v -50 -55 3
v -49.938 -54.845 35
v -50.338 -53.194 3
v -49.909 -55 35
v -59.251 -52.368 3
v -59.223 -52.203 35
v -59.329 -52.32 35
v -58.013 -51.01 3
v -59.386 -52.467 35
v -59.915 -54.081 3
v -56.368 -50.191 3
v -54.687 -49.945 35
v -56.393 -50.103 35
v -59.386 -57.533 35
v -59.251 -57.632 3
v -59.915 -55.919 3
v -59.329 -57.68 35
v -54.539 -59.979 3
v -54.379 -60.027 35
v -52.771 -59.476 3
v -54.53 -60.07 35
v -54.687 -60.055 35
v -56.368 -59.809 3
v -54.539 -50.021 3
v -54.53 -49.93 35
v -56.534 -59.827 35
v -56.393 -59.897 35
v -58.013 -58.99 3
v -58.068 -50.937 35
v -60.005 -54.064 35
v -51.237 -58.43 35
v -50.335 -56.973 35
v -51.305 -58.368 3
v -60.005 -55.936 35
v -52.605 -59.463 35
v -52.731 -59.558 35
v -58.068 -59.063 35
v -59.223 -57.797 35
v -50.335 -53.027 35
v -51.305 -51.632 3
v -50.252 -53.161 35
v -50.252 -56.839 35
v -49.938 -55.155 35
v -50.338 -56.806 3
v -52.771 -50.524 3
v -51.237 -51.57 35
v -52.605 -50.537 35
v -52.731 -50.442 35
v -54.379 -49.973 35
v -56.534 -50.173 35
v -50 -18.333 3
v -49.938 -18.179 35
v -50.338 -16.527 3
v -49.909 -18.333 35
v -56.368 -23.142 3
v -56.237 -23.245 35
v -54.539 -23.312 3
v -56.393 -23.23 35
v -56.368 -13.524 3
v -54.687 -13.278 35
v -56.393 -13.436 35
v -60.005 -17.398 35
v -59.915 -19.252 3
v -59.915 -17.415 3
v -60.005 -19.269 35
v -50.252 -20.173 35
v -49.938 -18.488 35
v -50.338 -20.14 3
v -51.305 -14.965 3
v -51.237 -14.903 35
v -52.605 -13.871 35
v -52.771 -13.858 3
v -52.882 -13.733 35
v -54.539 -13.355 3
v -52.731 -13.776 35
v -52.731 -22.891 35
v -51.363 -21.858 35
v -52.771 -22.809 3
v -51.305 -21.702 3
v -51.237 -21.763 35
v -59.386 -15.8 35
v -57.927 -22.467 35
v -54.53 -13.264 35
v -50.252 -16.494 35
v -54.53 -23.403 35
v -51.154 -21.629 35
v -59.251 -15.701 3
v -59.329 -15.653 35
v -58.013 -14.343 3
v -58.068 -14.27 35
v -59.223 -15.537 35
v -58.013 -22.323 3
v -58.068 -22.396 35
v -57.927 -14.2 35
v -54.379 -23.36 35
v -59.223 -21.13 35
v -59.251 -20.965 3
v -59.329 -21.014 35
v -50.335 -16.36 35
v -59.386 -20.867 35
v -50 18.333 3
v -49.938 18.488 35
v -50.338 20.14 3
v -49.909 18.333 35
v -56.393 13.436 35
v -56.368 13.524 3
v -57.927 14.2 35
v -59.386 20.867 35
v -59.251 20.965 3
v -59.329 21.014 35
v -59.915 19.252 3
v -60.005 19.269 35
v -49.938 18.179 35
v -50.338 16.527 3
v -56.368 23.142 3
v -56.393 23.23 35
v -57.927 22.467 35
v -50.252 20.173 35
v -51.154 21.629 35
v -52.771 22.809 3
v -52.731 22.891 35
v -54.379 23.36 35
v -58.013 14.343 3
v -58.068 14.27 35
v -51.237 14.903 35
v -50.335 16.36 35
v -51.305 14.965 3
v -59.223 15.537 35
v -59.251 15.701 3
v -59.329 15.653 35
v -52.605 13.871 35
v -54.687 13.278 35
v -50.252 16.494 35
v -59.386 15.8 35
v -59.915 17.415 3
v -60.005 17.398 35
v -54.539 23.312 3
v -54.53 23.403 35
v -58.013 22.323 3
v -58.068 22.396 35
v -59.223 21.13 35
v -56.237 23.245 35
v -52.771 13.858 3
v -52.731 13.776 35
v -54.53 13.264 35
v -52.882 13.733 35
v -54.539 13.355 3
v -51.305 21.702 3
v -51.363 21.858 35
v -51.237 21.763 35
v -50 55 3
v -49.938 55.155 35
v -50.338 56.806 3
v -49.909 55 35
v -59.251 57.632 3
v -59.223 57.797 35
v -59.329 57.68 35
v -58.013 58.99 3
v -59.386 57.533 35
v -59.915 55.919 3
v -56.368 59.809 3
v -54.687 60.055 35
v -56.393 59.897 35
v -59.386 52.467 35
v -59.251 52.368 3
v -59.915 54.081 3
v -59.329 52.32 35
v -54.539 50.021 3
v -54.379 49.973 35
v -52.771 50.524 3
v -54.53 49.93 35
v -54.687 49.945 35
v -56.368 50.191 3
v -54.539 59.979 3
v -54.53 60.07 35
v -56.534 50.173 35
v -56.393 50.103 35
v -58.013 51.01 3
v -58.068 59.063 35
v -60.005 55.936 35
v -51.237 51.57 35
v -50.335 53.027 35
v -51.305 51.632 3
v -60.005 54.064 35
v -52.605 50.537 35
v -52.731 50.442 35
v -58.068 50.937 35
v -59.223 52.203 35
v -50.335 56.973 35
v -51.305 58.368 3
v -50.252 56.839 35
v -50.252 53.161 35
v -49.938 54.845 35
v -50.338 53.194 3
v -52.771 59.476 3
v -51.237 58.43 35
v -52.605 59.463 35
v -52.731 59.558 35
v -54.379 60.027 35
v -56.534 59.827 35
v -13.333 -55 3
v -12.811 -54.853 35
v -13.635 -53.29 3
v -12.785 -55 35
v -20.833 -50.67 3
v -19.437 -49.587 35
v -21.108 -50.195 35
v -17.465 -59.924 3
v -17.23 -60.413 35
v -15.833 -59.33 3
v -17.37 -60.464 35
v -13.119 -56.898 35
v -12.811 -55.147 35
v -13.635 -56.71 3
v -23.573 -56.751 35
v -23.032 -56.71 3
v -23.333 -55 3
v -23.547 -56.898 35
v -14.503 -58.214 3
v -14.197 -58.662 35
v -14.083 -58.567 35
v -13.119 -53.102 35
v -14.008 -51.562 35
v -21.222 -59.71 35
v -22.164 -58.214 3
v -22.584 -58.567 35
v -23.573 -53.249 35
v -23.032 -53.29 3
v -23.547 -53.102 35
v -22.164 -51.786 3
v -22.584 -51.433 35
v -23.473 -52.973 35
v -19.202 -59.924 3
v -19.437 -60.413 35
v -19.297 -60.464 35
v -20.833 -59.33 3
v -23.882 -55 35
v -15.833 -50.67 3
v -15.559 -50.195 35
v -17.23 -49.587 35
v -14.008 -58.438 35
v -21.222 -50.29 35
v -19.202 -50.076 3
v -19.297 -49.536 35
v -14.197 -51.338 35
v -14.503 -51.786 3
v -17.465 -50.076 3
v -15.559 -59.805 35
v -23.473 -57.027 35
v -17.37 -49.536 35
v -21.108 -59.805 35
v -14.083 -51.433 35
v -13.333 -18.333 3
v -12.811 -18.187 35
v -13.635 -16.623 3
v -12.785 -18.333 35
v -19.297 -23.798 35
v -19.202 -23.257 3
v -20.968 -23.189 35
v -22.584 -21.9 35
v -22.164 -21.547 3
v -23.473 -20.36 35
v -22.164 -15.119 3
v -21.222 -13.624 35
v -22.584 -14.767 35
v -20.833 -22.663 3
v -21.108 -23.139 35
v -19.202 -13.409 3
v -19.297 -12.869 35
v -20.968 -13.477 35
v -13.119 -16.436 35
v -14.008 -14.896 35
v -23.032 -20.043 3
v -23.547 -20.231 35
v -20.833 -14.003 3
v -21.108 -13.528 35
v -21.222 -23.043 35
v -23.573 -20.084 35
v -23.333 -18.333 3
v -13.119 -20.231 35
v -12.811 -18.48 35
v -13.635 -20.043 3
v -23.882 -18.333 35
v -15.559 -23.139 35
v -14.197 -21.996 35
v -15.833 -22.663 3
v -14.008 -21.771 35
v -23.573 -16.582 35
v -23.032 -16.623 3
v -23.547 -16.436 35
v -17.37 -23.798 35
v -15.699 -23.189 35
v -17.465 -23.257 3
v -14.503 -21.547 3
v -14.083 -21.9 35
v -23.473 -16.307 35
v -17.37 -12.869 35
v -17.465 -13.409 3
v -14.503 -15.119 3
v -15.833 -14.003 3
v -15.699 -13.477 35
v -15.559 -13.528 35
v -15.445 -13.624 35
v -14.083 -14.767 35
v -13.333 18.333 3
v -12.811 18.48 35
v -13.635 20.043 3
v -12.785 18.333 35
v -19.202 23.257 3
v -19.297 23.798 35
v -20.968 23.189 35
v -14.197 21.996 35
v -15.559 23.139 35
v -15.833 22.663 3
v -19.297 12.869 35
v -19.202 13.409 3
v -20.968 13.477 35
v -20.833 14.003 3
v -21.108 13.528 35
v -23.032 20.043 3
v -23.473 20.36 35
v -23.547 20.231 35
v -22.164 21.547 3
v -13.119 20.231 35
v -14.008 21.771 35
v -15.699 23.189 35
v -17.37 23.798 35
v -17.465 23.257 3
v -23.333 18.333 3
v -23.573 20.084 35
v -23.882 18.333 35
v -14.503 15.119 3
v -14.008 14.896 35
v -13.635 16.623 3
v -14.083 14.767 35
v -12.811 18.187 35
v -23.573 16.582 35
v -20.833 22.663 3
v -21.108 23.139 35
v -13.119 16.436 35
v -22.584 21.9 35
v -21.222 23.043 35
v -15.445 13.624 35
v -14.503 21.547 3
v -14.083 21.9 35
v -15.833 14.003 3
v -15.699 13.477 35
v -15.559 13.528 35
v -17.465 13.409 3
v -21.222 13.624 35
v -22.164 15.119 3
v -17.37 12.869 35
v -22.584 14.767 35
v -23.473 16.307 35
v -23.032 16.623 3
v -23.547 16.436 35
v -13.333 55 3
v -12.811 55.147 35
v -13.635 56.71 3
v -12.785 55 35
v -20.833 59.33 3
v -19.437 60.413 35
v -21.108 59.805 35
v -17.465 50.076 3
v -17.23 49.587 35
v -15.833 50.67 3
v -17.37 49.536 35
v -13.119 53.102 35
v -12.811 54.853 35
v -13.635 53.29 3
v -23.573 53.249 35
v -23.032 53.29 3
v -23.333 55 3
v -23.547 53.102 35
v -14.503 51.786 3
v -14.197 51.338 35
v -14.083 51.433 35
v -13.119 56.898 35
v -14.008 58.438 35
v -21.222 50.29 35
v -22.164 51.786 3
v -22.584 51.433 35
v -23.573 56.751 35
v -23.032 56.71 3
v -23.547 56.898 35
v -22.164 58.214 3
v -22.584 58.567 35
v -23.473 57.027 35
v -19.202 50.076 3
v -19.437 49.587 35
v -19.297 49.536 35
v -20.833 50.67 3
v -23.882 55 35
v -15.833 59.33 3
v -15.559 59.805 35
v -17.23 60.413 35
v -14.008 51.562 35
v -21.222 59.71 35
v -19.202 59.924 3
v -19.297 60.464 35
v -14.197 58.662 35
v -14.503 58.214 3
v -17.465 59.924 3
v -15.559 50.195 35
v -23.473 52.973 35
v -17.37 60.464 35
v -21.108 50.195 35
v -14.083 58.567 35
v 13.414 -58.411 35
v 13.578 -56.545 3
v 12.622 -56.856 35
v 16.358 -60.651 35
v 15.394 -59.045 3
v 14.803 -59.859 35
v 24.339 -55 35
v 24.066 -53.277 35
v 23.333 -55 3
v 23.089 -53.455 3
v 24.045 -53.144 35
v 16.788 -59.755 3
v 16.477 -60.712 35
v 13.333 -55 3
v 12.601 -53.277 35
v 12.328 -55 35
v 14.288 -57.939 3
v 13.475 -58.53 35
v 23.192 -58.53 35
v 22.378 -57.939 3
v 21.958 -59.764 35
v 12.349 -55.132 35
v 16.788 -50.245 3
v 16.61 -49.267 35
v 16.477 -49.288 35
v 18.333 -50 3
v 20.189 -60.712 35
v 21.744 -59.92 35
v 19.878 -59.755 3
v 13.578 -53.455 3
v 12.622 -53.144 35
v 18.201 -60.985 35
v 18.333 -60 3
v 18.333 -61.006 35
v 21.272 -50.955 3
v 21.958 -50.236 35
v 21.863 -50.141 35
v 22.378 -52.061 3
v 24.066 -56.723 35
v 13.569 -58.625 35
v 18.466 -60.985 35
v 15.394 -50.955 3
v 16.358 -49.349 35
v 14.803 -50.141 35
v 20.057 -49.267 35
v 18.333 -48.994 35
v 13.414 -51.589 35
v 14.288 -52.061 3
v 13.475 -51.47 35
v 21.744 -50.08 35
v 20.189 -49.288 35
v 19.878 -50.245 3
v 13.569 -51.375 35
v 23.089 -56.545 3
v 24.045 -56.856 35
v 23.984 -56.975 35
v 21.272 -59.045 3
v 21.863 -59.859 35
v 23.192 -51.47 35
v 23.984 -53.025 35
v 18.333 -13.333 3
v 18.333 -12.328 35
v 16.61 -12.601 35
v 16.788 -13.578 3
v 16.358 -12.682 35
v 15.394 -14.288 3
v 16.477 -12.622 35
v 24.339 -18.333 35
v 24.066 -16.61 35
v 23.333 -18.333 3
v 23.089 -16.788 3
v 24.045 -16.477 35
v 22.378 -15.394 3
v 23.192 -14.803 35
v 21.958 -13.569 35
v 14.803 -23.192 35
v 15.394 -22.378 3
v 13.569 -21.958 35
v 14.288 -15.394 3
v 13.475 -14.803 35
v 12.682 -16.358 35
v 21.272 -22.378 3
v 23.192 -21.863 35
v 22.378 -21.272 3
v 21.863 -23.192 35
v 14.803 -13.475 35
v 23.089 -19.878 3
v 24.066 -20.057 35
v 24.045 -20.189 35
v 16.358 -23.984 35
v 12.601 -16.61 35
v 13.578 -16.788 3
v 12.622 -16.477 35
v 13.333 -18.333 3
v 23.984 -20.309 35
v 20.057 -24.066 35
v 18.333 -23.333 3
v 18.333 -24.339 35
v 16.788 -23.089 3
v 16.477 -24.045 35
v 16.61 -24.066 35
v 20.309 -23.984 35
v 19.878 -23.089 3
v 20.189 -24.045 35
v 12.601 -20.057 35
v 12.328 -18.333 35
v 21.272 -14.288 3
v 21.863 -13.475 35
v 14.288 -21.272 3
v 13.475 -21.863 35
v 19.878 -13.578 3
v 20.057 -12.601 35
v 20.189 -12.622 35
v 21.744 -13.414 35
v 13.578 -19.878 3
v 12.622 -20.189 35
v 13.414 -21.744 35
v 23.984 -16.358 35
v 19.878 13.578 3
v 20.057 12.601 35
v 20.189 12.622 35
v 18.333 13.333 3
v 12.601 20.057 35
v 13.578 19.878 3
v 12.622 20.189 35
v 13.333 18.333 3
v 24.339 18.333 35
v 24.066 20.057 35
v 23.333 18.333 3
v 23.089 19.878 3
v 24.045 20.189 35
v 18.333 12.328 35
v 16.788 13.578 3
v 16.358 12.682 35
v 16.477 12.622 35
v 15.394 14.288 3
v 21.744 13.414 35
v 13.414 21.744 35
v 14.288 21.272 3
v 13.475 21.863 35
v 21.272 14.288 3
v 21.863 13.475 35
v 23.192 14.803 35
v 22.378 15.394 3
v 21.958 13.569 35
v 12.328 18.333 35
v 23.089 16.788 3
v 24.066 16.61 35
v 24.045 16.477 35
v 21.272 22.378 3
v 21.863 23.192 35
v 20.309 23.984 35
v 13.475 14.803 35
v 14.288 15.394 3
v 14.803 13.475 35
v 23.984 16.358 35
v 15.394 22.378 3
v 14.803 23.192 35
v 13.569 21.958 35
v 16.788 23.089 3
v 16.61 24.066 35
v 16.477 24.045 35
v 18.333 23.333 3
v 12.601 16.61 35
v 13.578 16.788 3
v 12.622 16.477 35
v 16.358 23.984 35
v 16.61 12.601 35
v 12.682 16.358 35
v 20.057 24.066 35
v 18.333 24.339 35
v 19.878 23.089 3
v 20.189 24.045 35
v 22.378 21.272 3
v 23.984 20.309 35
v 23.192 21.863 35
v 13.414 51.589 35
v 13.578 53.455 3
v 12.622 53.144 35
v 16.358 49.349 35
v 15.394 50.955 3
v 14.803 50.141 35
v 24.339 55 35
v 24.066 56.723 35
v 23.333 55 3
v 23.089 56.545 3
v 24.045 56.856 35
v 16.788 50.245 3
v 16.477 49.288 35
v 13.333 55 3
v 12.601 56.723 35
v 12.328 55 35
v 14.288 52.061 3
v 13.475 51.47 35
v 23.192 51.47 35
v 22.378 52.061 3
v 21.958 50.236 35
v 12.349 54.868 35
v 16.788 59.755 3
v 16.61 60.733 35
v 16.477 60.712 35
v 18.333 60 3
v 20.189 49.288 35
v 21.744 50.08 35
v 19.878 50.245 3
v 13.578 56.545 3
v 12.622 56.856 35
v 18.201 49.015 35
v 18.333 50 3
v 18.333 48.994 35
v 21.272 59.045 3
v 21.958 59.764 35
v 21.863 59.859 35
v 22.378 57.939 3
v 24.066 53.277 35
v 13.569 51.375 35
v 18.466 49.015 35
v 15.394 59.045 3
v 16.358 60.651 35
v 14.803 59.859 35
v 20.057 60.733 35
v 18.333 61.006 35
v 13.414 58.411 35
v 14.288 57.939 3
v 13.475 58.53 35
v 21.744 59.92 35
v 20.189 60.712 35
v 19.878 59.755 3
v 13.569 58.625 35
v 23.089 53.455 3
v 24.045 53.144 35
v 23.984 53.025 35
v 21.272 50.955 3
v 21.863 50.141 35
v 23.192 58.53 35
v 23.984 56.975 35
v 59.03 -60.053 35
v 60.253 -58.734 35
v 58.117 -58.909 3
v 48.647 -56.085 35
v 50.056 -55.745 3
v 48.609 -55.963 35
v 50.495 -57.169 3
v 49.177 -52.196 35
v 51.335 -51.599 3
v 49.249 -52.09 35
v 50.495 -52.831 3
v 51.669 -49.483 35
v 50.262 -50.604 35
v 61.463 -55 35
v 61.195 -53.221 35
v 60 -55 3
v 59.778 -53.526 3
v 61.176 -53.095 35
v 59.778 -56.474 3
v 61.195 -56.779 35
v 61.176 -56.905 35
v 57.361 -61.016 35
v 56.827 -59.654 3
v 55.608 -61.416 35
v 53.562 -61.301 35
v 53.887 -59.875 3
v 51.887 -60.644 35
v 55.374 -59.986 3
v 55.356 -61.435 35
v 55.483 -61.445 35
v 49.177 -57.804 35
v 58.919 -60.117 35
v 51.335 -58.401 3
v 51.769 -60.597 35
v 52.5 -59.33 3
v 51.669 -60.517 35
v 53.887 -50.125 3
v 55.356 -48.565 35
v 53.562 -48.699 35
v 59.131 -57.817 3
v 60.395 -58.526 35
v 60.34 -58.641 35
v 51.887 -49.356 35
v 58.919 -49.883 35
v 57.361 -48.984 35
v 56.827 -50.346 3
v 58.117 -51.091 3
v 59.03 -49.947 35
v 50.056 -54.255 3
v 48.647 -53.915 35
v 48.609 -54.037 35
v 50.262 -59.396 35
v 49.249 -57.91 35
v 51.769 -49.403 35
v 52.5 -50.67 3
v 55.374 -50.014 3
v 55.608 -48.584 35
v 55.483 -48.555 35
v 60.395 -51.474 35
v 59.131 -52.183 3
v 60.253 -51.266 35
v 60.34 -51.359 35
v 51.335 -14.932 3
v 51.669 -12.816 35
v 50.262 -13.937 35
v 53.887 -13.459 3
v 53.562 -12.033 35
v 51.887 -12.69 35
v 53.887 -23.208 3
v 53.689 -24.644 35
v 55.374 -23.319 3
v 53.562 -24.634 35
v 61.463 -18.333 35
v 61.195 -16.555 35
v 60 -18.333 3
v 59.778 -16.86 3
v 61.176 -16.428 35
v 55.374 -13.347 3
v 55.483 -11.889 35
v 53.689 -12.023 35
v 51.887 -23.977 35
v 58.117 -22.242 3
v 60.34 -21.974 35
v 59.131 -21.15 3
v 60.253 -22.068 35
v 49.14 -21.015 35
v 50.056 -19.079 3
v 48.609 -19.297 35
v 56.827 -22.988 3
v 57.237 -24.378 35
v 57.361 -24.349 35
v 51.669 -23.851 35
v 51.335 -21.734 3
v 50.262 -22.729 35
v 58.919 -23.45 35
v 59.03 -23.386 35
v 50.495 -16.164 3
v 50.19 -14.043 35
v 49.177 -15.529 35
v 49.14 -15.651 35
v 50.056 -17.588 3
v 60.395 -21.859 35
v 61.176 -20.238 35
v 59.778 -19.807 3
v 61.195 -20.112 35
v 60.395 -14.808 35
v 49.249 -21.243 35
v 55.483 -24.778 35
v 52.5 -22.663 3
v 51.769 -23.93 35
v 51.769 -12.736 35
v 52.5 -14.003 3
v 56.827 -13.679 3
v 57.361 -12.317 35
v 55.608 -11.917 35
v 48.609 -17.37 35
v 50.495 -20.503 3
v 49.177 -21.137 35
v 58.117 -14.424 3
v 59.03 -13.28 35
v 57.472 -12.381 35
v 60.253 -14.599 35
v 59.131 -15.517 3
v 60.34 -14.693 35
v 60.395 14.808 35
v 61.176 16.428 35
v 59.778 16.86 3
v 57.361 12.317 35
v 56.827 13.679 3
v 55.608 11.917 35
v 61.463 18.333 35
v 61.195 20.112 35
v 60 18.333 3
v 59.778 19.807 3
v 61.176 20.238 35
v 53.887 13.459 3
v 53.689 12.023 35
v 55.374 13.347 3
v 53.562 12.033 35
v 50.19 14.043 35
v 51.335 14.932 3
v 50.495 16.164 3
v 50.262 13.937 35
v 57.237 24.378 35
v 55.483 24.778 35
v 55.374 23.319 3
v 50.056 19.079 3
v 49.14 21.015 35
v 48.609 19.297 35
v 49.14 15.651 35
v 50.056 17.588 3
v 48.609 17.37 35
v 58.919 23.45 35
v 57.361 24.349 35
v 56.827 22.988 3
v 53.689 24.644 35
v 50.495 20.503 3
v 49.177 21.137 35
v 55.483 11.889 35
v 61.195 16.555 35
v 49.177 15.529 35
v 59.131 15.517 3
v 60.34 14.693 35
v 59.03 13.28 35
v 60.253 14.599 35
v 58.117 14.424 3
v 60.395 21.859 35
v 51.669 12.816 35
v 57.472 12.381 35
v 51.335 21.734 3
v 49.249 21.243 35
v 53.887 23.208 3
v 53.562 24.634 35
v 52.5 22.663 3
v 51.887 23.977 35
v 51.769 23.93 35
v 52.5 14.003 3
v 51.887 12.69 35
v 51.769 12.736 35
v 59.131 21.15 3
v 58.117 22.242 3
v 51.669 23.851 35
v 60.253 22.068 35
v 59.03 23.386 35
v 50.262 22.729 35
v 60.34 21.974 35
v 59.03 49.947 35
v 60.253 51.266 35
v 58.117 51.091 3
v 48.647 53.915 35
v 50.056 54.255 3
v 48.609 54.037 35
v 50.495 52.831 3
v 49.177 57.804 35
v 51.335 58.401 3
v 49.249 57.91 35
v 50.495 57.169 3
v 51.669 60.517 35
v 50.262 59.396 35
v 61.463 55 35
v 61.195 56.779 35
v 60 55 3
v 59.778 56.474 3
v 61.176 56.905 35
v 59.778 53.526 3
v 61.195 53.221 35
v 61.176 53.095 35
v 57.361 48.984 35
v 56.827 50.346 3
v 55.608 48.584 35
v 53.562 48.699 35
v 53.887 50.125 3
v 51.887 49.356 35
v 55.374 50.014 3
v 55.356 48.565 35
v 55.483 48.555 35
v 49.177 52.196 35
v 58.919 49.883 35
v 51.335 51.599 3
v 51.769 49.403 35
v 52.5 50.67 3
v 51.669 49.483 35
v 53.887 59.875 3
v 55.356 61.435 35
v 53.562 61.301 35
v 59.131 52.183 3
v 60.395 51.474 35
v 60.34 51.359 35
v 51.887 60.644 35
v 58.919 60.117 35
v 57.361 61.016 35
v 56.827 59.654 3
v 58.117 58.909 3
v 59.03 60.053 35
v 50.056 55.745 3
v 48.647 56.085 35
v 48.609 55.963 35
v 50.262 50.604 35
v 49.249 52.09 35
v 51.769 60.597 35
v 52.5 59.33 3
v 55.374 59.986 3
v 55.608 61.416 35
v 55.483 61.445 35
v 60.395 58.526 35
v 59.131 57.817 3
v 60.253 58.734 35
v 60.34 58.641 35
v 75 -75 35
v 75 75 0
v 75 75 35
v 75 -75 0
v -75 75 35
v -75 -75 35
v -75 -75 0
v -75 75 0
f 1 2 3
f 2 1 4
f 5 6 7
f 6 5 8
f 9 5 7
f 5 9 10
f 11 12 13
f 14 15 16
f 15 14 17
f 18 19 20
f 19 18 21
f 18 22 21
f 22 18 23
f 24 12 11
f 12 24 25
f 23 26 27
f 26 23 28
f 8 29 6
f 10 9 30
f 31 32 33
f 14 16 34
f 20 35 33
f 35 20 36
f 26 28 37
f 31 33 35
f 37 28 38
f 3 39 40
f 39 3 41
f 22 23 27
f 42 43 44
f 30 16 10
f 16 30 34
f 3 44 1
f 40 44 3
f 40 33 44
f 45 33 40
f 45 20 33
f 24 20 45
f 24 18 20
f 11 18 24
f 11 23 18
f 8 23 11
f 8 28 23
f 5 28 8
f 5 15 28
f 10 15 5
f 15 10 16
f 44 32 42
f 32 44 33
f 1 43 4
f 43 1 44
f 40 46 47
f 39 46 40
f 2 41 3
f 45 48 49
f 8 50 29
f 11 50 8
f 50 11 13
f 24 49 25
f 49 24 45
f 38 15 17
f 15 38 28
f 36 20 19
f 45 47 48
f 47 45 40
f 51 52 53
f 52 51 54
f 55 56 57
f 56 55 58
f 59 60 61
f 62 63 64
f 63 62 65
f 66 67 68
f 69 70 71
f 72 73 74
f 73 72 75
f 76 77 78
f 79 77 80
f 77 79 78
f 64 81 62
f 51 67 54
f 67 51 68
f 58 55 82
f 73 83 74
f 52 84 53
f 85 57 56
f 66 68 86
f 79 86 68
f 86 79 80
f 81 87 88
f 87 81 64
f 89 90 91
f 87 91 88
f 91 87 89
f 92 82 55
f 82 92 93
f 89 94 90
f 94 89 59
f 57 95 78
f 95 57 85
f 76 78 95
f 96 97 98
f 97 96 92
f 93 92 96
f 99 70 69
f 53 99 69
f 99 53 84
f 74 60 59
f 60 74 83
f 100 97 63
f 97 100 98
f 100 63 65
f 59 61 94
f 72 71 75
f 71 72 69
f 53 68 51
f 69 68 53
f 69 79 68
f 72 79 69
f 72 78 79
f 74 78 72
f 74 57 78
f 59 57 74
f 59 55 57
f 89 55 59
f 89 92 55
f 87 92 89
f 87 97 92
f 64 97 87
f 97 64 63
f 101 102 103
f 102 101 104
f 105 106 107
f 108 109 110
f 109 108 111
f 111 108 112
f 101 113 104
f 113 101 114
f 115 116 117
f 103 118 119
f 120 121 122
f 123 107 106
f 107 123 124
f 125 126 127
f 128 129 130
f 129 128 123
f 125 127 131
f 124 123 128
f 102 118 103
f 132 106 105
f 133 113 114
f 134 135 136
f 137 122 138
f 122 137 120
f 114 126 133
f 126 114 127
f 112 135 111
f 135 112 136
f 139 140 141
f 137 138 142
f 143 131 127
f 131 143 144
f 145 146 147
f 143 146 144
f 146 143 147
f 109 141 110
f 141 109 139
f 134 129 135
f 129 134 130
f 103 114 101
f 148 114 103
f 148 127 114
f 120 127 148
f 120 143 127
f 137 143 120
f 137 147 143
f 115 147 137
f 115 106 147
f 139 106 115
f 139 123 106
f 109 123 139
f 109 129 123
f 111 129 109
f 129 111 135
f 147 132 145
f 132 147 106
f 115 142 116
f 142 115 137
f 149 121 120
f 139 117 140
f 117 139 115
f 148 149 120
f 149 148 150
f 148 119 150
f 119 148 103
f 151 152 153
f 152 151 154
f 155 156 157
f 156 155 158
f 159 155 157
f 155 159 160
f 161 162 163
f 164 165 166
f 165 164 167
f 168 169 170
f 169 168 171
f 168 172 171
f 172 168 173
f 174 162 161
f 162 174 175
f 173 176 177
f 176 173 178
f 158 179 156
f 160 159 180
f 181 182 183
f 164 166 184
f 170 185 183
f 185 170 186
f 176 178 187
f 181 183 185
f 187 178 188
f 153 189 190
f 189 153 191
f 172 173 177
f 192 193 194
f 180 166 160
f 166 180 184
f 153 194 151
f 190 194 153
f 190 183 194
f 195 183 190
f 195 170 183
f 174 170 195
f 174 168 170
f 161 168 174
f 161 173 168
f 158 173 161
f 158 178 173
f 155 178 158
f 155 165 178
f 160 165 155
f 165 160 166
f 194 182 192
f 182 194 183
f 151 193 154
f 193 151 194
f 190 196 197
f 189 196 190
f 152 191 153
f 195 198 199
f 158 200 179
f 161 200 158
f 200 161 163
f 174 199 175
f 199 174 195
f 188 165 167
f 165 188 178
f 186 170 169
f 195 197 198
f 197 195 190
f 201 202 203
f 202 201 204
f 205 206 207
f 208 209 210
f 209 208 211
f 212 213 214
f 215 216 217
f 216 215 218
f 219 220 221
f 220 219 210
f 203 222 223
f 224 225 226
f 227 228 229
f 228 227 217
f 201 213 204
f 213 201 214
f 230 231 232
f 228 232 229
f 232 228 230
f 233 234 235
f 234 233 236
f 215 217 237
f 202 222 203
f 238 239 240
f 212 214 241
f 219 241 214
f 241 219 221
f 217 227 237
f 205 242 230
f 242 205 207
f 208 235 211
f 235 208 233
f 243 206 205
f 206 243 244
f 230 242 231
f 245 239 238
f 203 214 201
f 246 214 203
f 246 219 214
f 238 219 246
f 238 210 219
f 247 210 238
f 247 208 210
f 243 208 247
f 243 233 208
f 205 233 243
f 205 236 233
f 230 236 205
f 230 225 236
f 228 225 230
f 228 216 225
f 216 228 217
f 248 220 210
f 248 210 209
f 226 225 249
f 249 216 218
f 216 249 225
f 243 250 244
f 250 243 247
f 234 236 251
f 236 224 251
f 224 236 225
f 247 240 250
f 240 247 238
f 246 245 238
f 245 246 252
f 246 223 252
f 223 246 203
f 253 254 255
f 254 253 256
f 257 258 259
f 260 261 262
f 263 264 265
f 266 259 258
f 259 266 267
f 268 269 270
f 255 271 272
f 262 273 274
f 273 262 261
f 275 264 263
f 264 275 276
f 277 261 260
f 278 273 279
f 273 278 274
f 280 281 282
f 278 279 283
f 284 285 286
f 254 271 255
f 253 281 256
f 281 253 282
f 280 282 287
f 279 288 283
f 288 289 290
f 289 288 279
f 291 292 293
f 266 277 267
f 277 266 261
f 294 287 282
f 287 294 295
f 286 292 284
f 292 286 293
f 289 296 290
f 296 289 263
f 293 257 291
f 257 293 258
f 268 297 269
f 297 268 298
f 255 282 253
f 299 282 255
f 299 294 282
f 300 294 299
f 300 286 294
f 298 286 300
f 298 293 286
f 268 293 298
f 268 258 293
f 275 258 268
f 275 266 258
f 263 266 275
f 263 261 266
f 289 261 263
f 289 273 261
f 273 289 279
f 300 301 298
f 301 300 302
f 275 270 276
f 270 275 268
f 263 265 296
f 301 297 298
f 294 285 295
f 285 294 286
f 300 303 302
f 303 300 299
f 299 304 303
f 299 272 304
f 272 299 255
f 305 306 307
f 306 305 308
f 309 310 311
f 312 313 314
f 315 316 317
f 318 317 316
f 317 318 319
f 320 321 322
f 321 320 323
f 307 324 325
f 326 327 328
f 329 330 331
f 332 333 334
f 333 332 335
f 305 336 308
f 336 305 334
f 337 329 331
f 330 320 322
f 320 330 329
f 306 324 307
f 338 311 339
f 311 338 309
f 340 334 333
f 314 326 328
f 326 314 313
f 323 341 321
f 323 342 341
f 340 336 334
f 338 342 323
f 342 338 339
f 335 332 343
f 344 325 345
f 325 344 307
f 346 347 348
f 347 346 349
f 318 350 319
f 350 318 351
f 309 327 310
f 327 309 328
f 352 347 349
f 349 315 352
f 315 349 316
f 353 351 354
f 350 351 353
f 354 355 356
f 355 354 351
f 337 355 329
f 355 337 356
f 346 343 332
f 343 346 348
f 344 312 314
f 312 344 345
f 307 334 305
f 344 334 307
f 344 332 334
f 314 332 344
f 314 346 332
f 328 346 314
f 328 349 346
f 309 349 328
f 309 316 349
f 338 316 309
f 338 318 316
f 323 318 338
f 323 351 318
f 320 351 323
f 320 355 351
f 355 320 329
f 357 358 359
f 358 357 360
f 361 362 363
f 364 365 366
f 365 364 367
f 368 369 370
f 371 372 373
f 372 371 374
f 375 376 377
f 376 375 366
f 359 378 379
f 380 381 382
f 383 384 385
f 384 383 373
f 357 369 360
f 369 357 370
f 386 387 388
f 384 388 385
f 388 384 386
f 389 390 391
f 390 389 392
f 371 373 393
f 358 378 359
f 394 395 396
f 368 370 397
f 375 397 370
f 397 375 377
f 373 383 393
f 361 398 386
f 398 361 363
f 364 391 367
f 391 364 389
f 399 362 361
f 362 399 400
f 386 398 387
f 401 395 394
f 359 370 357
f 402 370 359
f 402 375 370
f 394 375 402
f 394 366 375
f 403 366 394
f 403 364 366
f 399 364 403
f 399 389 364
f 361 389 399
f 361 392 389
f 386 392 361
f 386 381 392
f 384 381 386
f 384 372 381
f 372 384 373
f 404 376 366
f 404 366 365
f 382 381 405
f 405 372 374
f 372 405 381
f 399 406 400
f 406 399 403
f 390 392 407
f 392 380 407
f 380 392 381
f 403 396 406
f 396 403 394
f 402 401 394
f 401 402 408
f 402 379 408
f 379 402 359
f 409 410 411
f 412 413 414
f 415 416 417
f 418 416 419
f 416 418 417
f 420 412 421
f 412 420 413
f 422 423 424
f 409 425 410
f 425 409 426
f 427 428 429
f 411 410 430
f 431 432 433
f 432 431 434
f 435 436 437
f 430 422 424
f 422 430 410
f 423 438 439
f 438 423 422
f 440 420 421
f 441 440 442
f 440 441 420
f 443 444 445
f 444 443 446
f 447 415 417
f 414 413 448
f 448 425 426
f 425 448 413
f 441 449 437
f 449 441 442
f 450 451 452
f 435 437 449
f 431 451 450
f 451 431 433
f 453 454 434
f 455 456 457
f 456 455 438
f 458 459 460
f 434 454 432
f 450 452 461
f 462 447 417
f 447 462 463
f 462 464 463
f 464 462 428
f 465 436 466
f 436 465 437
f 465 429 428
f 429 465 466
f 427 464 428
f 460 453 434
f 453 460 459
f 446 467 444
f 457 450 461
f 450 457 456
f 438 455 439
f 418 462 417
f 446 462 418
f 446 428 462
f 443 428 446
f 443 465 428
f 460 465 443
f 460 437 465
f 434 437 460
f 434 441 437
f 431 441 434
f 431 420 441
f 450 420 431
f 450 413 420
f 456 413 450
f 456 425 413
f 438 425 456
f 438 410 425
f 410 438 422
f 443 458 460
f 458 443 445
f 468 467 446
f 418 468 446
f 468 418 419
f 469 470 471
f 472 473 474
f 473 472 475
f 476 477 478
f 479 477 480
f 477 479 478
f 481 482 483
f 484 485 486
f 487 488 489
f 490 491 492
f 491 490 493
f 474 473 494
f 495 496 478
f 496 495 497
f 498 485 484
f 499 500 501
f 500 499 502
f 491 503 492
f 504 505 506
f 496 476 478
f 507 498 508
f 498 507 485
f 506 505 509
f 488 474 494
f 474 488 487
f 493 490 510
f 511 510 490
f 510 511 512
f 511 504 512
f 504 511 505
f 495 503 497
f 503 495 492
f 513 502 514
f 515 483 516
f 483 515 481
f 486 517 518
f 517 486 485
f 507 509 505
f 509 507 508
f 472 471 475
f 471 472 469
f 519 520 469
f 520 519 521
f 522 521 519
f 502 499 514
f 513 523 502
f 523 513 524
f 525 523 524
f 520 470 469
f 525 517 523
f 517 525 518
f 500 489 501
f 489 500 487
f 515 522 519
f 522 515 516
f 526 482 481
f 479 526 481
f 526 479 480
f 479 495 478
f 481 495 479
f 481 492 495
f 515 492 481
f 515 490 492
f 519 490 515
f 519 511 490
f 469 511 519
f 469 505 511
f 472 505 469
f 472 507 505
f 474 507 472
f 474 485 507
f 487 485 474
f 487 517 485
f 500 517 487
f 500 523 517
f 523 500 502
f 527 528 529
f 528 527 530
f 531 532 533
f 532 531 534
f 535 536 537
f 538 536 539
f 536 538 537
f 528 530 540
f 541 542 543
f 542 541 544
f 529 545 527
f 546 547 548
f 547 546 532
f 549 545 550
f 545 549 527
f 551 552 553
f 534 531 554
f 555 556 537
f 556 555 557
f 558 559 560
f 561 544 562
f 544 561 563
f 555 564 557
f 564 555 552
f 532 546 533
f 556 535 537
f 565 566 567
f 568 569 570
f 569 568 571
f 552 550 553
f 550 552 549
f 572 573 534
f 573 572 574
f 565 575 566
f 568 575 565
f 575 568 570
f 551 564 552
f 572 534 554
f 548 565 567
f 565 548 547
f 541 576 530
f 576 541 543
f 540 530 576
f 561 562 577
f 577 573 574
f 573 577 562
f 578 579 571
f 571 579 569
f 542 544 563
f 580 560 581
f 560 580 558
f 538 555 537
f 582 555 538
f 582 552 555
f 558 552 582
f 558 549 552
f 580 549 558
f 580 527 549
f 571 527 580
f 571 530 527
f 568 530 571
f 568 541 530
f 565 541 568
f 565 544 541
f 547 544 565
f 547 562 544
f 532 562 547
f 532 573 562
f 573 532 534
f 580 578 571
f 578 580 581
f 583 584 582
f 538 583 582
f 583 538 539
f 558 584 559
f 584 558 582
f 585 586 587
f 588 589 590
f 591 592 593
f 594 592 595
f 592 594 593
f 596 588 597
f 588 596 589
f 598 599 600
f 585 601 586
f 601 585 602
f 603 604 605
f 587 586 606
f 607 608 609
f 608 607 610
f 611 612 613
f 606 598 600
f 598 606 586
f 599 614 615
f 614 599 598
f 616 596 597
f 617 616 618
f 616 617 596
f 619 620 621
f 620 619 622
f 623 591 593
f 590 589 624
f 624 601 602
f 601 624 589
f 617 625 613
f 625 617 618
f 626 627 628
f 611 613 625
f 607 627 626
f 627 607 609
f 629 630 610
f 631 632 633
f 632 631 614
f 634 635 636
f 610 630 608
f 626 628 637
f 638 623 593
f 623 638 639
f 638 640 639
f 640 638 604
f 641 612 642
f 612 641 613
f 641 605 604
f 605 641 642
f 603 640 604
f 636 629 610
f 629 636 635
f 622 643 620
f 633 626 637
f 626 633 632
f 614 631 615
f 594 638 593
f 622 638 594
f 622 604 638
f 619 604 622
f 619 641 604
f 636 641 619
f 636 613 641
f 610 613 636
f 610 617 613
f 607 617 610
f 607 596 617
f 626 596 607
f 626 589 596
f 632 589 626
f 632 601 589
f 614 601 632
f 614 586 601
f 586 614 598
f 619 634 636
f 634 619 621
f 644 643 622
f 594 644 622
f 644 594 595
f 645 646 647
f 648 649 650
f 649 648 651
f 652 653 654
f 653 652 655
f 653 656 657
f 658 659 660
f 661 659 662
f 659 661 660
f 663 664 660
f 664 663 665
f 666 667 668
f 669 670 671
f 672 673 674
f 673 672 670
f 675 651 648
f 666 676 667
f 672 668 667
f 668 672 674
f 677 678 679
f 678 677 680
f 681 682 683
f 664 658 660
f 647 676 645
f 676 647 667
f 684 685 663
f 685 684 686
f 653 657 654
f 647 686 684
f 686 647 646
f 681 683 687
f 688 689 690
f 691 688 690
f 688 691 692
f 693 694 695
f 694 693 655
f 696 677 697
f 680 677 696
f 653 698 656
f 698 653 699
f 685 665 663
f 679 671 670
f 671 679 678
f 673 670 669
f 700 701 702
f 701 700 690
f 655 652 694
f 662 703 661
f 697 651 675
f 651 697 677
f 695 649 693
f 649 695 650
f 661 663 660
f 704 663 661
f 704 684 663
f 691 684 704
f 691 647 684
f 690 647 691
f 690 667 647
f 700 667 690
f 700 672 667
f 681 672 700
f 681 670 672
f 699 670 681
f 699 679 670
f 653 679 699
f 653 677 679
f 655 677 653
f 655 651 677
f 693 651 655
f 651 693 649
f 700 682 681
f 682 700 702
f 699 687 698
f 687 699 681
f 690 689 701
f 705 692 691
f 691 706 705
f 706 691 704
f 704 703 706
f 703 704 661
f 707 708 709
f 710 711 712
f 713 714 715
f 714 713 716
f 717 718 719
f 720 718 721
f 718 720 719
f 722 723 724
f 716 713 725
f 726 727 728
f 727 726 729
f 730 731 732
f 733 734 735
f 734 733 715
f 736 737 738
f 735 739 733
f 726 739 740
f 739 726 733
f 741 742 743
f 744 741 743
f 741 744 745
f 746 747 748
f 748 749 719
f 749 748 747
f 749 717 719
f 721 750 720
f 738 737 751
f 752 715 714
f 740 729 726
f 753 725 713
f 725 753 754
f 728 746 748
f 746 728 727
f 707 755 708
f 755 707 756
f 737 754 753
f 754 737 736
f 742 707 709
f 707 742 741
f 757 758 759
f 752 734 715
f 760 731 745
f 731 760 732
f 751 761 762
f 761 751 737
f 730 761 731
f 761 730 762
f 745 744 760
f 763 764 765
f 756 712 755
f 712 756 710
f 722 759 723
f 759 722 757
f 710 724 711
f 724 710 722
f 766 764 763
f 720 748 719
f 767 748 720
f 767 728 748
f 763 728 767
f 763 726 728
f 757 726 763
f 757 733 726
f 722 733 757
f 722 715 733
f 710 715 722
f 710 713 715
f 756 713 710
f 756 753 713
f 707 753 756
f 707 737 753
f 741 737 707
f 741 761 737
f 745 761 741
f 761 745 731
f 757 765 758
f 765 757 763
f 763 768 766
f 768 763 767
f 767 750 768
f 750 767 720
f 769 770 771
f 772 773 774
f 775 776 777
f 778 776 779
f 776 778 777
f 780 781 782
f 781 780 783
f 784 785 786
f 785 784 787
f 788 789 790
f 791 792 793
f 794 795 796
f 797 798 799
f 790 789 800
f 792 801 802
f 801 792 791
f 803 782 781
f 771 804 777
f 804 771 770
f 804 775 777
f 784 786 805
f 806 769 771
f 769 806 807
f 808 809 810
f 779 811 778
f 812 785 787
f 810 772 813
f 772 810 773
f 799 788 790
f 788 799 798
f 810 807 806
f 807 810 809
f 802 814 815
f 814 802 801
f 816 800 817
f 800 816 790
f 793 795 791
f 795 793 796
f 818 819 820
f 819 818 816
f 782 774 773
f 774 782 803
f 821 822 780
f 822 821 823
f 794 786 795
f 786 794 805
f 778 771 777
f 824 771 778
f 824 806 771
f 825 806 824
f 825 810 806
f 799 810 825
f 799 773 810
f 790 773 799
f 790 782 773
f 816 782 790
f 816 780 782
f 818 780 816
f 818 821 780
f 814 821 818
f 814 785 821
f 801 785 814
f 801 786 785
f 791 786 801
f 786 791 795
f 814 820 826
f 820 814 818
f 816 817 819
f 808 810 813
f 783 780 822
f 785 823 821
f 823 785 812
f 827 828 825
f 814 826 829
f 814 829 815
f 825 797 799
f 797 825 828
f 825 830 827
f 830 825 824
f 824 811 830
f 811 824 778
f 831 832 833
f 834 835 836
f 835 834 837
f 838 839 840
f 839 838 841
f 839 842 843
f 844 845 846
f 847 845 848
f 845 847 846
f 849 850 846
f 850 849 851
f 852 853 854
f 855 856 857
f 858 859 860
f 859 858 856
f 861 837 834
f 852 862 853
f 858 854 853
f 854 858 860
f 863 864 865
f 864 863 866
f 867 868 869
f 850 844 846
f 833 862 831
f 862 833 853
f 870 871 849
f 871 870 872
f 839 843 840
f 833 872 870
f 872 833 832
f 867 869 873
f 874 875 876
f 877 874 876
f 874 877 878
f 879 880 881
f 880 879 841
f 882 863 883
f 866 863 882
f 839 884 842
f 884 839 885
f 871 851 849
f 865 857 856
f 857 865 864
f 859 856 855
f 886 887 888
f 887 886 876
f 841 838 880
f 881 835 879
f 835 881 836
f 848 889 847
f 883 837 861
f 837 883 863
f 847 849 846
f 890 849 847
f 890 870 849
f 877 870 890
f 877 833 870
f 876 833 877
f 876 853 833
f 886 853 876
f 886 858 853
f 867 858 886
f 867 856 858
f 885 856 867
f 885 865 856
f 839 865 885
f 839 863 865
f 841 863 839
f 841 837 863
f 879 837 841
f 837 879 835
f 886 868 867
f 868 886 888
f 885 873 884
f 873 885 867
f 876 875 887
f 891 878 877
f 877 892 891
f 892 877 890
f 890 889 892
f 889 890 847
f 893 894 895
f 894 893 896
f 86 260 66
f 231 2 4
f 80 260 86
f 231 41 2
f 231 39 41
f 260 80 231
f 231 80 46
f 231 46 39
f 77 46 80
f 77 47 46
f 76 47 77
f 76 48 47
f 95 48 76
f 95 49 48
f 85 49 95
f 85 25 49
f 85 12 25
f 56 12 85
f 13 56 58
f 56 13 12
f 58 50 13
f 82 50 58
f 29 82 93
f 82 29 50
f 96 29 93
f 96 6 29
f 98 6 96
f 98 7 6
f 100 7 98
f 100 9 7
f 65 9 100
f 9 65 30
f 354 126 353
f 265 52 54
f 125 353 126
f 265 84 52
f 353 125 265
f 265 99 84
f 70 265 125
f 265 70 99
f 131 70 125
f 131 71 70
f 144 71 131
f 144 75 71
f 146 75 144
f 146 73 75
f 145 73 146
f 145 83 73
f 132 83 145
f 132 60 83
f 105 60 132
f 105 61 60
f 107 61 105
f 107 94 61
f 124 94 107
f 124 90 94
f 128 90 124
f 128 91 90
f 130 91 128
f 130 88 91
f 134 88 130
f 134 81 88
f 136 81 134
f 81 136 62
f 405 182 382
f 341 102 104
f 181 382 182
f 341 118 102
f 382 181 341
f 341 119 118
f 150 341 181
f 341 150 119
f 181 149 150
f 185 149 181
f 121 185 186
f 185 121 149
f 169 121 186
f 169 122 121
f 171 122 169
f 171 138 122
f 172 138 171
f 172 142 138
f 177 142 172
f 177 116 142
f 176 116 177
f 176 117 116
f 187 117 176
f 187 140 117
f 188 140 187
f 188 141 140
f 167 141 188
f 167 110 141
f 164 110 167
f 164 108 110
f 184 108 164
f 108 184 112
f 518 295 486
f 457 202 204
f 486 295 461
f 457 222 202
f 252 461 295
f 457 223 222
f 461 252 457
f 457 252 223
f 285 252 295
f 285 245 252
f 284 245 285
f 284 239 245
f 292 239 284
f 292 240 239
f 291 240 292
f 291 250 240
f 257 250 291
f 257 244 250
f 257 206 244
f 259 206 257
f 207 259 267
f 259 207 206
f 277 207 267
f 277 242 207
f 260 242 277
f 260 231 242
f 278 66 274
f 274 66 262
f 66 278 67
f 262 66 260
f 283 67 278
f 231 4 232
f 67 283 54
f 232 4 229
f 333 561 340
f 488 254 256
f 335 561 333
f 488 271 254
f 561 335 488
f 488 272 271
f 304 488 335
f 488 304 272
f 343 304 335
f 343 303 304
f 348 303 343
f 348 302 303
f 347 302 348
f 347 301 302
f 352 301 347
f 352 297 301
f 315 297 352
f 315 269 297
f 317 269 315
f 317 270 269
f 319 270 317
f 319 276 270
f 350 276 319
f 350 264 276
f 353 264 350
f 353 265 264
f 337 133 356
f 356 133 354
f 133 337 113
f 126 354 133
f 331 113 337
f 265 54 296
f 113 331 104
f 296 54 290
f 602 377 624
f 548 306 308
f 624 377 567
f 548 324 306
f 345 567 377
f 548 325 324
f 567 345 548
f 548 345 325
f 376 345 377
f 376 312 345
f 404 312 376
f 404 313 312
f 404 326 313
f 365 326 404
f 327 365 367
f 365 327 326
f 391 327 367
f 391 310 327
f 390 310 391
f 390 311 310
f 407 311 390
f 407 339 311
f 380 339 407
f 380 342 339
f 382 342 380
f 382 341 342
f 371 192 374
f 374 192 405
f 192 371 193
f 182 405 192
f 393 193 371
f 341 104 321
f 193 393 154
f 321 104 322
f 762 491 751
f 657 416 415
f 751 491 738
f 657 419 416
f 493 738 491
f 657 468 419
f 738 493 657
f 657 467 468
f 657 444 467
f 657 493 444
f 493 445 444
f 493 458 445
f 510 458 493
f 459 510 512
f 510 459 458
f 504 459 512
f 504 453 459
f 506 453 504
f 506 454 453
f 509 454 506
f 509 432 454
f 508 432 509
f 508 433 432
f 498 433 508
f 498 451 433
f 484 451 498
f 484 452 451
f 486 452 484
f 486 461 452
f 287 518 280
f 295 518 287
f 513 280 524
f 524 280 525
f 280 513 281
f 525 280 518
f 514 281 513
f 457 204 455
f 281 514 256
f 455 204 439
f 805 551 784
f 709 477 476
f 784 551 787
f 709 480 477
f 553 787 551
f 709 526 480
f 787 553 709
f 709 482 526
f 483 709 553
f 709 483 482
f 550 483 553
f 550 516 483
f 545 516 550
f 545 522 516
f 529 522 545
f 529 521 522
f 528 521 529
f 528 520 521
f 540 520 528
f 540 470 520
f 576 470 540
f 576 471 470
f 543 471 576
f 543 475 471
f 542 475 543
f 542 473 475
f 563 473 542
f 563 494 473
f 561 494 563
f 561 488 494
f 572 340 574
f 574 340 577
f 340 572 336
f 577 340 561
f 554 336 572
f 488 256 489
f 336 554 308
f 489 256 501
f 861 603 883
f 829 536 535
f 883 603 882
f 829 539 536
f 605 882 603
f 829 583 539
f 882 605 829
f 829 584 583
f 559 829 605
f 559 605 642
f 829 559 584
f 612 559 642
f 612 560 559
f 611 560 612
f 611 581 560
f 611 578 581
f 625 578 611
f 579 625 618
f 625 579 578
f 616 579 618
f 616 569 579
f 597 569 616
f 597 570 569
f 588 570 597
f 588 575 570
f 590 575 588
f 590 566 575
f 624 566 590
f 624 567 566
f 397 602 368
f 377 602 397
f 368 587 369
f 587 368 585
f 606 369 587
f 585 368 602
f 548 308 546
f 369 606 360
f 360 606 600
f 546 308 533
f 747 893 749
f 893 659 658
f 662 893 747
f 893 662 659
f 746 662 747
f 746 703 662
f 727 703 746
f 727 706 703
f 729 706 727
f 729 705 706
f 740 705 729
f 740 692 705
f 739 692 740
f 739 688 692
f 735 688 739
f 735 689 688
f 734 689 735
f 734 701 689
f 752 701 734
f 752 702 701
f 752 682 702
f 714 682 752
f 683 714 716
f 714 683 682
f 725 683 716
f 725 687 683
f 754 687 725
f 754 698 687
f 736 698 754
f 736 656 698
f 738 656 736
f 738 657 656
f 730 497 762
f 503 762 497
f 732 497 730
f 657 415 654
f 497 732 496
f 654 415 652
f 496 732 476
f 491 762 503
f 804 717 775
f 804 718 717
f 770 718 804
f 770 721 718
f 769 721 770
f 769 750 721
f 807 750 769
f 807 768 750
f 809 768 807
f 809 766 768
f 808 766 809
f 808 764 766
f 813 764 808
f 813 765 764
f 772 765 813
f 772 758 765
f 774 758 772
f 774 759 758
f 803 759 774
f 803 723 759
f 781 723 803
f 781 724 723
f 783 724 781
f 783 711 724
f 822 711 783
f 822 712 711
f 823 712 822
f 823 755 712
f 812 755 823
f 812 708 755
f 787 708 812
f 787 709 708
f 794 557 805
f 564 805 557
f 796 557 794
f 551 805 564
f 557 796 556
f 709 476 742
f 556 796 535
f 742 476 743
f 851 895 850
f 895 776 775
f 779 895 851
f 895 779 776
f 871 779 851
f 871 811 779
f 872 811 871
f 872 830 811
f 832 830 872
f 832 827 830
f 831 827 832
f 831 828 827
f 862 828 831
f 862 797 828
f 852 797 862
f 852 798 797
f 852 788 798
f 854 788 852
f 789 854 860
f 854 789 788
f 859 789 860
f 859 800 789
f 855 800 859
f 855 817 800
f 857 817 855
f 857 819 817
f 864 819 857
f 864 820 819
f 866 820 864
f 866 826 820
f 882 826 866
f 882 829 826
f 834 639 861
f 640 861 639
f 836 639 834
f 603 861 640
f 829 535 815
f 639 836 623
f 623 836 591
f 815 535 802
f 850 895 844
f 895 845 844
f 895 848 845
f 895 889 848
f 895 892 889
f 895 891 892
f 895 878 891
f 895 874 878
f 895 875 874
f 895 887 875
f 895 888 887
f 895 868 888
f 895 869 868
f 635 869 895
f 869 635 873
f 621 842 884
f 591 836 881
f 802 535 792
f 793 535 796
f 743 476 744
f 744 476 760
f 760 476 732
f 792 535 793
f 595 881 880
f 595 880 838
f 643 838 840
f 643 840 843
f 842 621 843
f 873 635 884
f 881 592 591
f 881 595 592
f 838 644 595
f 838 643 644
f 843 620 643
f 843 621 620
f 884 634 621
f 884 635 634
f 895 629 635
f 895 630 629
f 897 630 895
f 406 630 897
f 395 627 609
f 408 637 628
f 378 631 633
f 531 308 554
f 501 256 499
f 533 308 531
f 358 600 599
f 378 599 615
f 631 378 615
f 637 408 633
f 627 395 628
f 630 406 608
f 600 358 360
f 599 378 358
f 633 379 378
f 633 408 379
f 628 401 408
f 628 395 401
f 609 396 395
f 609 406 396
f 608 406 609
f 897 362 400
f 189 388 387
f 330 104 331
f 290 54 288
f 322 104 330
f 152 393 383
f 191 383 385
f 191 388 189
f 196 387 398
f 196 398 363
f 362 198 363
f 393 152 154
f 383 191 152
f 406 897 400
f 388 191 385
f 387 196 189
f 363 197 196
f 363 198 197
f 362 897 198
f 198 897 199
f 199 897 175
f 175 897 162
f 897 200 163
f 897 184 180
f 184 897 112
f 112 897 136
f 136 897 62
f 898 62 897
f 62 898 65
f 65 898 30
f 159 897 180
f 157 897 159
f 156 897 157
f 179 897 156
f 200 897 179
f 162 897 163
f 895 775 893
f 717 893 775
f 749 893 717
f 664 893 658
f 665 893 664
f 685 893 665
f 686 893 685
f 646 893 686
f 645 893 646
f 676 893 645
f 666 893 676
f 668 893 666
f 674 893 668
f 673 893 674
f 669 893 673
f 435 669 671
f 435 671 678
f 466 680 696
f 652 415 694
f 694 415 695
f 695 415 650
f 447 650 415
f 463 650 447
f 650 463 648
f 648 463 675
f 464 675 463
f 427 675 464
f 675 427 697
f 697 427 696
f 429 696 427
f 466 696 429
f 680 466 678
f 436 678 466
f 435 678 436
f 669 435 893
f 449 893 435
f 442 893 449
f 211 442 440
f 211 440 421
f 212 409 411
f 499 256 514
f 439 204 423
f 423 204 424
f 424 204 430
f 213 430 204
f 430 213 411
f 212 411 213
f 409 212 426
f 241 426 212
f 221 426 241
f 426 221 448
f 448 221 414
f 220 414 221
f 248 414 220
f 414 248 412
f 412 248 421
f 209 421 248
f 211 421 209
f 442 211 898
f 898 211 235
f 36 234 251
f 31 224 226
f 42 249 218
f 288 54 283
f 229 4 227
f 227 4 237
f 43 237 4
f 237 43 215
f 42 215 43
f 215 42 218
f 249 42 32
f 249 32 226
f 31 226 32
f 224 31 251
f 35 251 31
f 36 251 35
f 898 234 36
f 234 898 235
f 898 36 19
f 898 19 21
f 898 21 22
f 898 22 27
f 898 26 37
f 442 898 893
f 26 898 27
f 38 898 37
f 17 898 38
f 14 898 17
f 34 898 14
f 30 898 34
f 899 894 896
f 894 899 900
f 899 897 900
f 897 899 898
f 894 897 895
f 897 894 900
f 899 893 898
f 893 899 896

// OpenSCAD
width = 150;
depth = 150;
height = 35;
rows = 4;
columns = 4;
spacing = 20;
xspace = (width - spacing - spacing) / (rows - 1);
yspace = (depth - spacing - spacing) / (columns - 1);
left = -(width / 2);
right = (width / 2);
back = -(depth / 2);
hole_r1 = 5;
hole_r2 = 5.1;

translate([left, back])
{
    difference()
    {
        cube([width, depth, height]);
        
        for (x=[0:rows-1])
        {
            for (y=[0:columns-1])
            {
                translate([spacing + (x * xspace),
                    spacing + (y * yspace), 3])
                {
                    cylinder(h = height, r1 = hole_r1, r2 = hole_r2 + (x/2));
                }
            }
        }           
    }
}
